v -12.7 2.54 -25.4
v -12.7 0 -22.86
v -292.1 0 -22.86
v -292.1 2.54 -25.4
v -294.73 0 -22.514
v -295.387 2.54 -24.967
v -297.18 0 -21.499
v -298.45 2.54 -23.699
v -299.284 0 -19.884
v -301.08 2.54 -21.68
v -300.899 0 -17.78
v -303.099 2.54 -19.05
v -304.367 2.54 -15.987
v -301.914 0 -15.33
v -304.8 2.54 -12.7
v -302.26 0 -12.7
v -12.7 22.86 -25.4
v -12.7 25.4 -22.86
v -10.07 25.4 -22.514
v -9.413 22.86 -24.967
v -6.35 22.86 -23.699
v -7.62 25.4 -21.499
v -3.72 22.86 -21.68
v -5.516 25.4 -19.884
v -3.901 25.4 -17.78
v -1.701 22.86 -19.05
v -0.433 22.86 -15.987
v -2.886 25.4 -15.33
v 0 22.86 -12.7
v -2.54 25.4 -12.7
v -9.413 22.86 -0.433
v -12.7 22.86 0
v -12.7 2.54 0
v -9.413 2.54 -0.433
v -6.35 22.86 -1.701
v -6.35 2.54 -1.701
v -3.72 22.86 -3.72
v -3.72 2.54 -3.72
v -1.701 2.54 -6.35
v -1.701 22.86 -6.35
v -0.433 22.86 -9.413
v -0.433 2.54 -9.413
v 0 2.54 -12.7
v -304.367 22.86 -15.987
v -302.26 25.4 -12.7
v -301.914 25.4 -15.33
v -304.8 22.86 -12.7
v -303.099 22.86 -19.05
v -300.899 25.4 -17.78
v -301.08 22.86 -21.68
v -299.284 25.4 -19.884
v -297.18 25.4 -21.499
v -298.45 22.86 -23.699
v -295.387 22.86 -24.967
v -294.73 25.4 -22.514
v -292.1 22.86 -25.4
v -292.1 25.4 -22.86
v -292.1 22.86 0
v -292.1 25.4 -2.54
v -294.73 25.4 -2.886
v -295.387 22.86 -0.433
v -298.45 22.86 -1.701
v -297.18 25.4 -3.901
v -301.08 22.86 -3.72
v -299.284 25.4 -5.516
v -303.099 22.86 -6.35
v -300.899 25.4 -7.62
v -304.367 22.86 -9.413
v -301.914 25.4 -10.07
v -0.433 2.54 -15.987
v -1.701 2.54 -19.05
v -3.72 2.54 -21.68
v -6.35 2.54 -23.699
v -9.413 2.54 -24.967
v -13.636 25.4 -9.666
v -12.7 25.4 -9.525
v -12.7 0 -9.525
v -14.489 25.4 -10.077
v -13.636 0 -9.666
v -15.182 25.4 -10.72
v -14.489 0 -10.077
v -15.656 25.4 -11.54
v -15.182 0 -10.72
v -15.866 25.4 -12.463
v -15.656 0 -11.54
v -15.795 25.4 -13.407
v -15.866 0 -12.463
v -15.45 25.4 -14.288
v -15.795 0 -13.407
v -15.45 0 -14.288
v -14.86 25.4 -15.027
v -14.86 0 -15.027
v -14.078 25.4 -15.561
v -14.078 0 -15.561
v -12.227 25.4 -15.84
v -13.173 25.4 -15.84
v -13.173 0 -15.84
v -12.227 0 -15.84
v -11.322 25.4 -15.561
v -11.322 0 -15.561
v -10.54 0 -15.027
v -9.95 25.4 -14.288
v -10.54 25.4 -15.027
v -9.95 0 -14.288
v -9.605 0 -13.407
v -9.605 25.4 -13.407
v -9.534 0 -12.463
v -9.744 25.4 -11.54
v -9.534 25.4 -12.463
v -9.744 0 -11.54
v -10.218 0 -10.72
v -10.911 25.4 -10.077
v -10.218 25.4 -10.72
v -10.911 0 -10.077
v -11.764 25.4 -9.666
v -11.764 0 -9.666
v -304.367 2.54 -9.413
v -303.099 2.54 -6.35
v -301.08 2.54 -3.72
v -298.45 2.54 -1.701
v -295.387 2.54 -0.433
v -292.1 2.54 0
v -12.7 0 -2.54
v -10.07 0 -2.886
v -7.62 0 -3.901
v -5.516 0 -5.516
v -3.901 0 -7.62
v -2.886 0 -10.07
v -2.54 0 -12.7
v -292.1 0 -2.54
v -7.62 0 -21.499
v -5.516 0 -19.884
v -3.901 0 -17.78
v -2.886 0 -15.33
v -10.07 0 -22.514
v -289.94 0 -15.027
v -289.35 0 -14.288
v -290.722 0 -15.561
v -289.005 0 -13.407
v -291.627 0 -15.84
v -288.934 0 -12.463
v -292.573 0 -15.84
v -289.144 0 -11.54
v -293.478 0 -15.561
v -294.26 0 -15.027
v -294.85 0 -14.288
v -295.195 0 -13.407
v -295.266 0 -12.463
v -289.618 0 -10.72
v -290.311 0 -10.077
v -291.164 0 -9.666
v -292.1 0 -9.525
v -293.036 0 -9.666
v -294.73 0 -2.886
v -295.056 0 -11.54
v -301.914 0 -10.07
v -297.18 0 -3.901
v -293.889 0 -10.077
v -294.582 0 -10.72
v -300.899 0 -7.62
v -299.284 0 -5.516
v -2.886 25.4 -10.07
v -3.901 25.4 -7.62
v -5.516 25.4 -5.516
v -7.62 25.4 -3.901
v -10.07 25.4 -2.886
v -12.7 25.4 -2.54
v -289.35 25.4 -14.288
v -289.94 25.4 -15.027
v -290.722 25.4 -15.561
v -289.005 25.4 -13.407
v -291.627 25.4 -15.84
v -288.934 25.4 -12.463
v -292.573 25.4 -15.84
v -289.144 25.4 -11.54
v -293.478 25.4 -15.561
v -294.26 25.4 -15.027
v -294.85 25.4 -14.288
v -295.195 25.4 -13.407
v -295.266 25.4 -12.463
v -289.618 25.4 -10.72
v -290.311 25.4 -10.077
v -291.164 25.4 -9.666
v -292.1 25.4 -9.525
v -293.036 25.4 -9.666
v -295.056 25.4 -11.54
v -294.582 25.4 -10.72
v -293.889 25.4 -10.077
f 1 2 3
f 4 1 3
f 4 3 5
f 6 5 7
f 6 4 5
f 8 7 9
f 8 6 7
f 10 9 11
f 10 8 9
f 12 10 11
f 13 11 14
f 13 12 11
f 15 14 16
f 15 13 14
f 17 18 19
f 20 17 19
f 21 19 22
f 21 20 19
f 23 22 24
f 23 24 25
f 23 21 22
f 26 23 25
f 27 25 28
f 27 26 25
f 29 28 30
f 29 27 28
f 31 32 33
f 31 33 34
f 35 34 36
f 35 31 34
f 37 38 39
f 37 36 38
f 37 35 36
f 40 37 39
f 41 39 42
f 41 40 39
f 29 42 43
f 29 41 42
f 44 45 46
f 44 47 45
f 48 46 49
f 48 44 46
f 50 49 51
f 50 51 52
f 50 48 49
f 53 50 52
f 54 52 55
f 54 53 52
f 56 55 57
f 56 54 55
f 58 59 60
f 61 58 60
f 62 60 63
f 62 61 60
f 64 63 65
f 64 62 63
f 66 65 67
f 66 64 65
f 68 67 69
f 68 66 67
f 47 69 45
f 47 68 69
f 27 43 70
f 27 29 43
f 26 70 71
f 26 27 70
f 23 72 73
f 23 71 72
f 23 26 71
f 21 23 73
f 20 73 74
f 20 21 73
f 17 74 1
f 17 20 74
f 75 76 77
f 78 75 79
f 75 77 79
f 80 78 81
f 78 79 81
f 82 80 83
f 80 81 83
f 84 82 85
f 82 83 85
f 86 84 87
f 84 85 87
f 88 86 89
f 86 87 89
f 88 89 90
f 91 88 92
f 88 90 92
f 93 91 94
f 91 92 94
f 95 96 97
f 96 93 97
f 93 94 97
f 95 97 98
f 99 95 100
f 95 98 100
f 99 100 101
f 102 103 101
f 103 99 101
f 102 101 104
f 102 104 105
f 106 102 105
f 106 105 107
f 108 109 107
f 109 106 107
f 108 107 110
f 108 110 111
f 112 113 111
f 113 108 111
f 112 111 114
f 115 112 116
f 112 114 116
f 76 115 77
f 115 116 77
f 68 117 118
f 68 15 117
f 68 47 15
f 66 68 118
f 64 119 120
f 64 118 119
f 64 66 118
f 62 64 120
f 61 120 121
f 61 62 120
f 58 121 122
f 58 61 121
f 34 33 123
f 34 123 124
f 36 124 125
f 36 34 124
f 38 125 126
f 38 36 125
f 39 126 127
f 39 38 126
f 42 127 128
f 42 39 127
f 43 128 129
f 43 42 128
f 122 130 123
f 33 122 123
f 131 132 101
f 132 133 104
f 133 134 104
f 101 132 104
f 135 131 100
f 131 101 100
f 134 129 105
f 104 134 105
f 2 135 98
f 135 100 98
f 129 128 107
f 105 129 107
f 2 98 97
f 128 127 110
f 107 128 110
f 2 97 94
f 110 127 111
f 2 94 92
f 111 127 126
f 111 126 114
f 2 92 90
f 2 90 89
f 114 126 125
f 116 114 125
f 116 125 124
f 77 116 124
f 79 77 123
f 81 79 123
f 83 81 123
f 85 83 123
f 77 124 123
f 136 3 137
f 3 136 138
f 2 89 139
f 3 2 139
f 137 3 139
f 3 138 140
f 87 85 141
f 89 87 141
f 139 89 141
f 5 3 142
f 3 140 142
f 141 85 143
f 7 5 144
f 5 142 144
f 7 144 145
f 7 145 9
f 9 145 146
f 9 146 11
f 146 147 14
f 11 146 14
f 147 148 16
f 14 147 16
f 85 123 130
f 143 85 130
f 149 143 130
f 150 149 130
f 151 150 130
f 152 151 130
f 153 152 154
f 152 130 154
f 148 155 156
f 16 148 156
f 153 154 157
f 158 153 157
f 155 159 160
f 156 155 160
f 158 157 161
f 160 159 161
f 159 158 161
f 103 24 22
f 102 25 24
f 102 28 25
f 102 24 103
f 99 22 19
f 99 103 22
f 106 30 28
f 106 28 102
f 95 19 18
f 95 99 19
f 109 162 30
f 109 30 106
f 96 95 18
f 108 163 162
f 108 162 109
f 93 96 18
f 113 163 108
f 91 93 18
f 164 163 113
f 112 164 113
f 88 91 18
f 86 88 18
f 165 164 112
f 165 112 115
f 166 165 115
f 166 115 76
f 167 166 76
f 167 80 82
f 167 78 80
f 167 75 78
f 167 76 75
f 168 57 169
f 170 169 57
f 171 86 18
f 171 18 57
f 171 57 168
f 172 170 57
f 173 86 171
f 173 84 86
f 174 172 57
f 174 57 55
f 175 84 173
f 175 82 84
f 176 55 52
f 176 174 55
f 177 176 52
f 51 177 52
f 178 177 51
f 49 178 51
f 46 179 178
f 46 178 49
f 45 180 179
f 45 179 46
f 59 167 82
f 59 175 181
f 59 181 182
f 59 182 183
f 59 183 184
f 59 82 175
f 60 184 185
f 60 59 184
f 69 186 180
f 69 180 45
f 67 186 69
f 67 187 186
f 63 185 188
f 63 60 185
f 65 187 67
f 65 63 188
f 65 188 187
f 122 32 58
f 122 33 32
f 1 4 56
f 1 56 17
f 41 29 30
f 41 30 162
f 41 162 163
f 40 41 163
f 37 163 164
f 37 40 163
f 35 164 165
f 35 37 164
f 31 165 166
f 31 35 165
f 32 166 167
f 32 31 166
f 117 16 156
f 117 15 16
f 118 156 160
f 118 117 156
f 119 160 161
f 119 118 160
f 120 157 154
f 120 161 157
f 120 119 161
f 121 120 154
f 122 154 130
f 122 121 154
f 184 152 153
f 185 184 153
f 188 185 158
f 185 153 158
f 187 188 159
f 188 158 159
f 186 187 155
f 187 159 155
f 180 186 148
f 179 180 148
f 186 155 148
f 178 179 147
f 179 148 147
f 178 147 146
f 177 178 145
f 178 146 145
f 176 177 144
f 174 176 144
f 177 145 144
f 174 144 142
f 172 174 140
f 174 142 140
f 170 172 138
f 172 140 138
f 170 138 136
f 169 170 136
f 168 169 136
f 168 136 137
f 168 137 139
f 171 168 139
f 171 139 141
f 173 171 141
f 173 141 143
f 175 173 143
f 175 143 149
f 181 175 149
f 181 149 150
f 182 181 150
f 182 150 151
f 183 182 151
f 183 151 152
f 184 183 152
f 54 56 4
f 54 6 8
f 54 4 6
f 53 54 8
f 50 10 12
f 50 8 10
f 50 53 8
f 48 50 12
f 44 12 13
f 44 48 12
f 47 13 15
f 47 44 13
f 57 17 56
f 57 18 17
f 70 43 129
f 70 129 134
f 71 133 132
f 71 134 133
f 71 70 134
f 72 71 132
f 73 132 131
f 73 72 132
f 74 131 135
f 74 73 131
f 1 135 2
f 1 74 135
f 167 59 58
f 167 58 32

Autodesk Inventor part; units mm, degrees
ref_plane "YZ Plane" through (0, 0, 0) normal (1, 0, 0) x (0, 1, 0)
ref_plane "XZ Plane" through (0, 0, 0) normal (0, 1, 0) x (-1, 0, 0)
sketch "Sketch1" plane through (0, 0, 0) normal (0, 1, 0) x (-1, 0, 0)
  line L0 (0, 0) -> (304.8, 0)
  line L1 (304.8, 0) -> (304.8, -25.4)
  line L2 (304.8, -25.4) -> (0, -25.4)
  line L3 (0, -25.4) -> (0, 0)
  dimension "d0" = 304.8
  dimension "d1" = 25.4
extrude "Extrusion1" add sketch "Sketch1" along normal blind 25.4
hole "Hole1" at (-292.1, 25.4, -12.7) direction (0, -1, 0) diameter 6.35 end through all
ref_plane "Work Plane1" through (-152.4, 0, 0) normal (1, 0, 0) x (0, 0, -1)
mirror "Mirror1" about plane through (-152.4, 0, 0) normal (1, 0, 0) of "Hole1"
fillet "Fillet1" radius 12.7 4 edges at (-304.8, 12.7, -25.4) (-304.8, 12.7, 0) (0, 12.7, -25.4) (0, 12.7, 0)
chamfer "Chamfer1" distance 2.54 angle 45 8 edges at (-152.4, 25.4, 0) (-3.7197, 25.4, -21.6803) (-152.4, 25.4, -25.4) (-301.0803, 25.4, -21.6803) (-152.4, 0, 0) (-301.0803, 0, -21.6803) (-152.4, 0, -25.4) (-3.7197, 0, -21.6803)
properties part number "longerBar"
